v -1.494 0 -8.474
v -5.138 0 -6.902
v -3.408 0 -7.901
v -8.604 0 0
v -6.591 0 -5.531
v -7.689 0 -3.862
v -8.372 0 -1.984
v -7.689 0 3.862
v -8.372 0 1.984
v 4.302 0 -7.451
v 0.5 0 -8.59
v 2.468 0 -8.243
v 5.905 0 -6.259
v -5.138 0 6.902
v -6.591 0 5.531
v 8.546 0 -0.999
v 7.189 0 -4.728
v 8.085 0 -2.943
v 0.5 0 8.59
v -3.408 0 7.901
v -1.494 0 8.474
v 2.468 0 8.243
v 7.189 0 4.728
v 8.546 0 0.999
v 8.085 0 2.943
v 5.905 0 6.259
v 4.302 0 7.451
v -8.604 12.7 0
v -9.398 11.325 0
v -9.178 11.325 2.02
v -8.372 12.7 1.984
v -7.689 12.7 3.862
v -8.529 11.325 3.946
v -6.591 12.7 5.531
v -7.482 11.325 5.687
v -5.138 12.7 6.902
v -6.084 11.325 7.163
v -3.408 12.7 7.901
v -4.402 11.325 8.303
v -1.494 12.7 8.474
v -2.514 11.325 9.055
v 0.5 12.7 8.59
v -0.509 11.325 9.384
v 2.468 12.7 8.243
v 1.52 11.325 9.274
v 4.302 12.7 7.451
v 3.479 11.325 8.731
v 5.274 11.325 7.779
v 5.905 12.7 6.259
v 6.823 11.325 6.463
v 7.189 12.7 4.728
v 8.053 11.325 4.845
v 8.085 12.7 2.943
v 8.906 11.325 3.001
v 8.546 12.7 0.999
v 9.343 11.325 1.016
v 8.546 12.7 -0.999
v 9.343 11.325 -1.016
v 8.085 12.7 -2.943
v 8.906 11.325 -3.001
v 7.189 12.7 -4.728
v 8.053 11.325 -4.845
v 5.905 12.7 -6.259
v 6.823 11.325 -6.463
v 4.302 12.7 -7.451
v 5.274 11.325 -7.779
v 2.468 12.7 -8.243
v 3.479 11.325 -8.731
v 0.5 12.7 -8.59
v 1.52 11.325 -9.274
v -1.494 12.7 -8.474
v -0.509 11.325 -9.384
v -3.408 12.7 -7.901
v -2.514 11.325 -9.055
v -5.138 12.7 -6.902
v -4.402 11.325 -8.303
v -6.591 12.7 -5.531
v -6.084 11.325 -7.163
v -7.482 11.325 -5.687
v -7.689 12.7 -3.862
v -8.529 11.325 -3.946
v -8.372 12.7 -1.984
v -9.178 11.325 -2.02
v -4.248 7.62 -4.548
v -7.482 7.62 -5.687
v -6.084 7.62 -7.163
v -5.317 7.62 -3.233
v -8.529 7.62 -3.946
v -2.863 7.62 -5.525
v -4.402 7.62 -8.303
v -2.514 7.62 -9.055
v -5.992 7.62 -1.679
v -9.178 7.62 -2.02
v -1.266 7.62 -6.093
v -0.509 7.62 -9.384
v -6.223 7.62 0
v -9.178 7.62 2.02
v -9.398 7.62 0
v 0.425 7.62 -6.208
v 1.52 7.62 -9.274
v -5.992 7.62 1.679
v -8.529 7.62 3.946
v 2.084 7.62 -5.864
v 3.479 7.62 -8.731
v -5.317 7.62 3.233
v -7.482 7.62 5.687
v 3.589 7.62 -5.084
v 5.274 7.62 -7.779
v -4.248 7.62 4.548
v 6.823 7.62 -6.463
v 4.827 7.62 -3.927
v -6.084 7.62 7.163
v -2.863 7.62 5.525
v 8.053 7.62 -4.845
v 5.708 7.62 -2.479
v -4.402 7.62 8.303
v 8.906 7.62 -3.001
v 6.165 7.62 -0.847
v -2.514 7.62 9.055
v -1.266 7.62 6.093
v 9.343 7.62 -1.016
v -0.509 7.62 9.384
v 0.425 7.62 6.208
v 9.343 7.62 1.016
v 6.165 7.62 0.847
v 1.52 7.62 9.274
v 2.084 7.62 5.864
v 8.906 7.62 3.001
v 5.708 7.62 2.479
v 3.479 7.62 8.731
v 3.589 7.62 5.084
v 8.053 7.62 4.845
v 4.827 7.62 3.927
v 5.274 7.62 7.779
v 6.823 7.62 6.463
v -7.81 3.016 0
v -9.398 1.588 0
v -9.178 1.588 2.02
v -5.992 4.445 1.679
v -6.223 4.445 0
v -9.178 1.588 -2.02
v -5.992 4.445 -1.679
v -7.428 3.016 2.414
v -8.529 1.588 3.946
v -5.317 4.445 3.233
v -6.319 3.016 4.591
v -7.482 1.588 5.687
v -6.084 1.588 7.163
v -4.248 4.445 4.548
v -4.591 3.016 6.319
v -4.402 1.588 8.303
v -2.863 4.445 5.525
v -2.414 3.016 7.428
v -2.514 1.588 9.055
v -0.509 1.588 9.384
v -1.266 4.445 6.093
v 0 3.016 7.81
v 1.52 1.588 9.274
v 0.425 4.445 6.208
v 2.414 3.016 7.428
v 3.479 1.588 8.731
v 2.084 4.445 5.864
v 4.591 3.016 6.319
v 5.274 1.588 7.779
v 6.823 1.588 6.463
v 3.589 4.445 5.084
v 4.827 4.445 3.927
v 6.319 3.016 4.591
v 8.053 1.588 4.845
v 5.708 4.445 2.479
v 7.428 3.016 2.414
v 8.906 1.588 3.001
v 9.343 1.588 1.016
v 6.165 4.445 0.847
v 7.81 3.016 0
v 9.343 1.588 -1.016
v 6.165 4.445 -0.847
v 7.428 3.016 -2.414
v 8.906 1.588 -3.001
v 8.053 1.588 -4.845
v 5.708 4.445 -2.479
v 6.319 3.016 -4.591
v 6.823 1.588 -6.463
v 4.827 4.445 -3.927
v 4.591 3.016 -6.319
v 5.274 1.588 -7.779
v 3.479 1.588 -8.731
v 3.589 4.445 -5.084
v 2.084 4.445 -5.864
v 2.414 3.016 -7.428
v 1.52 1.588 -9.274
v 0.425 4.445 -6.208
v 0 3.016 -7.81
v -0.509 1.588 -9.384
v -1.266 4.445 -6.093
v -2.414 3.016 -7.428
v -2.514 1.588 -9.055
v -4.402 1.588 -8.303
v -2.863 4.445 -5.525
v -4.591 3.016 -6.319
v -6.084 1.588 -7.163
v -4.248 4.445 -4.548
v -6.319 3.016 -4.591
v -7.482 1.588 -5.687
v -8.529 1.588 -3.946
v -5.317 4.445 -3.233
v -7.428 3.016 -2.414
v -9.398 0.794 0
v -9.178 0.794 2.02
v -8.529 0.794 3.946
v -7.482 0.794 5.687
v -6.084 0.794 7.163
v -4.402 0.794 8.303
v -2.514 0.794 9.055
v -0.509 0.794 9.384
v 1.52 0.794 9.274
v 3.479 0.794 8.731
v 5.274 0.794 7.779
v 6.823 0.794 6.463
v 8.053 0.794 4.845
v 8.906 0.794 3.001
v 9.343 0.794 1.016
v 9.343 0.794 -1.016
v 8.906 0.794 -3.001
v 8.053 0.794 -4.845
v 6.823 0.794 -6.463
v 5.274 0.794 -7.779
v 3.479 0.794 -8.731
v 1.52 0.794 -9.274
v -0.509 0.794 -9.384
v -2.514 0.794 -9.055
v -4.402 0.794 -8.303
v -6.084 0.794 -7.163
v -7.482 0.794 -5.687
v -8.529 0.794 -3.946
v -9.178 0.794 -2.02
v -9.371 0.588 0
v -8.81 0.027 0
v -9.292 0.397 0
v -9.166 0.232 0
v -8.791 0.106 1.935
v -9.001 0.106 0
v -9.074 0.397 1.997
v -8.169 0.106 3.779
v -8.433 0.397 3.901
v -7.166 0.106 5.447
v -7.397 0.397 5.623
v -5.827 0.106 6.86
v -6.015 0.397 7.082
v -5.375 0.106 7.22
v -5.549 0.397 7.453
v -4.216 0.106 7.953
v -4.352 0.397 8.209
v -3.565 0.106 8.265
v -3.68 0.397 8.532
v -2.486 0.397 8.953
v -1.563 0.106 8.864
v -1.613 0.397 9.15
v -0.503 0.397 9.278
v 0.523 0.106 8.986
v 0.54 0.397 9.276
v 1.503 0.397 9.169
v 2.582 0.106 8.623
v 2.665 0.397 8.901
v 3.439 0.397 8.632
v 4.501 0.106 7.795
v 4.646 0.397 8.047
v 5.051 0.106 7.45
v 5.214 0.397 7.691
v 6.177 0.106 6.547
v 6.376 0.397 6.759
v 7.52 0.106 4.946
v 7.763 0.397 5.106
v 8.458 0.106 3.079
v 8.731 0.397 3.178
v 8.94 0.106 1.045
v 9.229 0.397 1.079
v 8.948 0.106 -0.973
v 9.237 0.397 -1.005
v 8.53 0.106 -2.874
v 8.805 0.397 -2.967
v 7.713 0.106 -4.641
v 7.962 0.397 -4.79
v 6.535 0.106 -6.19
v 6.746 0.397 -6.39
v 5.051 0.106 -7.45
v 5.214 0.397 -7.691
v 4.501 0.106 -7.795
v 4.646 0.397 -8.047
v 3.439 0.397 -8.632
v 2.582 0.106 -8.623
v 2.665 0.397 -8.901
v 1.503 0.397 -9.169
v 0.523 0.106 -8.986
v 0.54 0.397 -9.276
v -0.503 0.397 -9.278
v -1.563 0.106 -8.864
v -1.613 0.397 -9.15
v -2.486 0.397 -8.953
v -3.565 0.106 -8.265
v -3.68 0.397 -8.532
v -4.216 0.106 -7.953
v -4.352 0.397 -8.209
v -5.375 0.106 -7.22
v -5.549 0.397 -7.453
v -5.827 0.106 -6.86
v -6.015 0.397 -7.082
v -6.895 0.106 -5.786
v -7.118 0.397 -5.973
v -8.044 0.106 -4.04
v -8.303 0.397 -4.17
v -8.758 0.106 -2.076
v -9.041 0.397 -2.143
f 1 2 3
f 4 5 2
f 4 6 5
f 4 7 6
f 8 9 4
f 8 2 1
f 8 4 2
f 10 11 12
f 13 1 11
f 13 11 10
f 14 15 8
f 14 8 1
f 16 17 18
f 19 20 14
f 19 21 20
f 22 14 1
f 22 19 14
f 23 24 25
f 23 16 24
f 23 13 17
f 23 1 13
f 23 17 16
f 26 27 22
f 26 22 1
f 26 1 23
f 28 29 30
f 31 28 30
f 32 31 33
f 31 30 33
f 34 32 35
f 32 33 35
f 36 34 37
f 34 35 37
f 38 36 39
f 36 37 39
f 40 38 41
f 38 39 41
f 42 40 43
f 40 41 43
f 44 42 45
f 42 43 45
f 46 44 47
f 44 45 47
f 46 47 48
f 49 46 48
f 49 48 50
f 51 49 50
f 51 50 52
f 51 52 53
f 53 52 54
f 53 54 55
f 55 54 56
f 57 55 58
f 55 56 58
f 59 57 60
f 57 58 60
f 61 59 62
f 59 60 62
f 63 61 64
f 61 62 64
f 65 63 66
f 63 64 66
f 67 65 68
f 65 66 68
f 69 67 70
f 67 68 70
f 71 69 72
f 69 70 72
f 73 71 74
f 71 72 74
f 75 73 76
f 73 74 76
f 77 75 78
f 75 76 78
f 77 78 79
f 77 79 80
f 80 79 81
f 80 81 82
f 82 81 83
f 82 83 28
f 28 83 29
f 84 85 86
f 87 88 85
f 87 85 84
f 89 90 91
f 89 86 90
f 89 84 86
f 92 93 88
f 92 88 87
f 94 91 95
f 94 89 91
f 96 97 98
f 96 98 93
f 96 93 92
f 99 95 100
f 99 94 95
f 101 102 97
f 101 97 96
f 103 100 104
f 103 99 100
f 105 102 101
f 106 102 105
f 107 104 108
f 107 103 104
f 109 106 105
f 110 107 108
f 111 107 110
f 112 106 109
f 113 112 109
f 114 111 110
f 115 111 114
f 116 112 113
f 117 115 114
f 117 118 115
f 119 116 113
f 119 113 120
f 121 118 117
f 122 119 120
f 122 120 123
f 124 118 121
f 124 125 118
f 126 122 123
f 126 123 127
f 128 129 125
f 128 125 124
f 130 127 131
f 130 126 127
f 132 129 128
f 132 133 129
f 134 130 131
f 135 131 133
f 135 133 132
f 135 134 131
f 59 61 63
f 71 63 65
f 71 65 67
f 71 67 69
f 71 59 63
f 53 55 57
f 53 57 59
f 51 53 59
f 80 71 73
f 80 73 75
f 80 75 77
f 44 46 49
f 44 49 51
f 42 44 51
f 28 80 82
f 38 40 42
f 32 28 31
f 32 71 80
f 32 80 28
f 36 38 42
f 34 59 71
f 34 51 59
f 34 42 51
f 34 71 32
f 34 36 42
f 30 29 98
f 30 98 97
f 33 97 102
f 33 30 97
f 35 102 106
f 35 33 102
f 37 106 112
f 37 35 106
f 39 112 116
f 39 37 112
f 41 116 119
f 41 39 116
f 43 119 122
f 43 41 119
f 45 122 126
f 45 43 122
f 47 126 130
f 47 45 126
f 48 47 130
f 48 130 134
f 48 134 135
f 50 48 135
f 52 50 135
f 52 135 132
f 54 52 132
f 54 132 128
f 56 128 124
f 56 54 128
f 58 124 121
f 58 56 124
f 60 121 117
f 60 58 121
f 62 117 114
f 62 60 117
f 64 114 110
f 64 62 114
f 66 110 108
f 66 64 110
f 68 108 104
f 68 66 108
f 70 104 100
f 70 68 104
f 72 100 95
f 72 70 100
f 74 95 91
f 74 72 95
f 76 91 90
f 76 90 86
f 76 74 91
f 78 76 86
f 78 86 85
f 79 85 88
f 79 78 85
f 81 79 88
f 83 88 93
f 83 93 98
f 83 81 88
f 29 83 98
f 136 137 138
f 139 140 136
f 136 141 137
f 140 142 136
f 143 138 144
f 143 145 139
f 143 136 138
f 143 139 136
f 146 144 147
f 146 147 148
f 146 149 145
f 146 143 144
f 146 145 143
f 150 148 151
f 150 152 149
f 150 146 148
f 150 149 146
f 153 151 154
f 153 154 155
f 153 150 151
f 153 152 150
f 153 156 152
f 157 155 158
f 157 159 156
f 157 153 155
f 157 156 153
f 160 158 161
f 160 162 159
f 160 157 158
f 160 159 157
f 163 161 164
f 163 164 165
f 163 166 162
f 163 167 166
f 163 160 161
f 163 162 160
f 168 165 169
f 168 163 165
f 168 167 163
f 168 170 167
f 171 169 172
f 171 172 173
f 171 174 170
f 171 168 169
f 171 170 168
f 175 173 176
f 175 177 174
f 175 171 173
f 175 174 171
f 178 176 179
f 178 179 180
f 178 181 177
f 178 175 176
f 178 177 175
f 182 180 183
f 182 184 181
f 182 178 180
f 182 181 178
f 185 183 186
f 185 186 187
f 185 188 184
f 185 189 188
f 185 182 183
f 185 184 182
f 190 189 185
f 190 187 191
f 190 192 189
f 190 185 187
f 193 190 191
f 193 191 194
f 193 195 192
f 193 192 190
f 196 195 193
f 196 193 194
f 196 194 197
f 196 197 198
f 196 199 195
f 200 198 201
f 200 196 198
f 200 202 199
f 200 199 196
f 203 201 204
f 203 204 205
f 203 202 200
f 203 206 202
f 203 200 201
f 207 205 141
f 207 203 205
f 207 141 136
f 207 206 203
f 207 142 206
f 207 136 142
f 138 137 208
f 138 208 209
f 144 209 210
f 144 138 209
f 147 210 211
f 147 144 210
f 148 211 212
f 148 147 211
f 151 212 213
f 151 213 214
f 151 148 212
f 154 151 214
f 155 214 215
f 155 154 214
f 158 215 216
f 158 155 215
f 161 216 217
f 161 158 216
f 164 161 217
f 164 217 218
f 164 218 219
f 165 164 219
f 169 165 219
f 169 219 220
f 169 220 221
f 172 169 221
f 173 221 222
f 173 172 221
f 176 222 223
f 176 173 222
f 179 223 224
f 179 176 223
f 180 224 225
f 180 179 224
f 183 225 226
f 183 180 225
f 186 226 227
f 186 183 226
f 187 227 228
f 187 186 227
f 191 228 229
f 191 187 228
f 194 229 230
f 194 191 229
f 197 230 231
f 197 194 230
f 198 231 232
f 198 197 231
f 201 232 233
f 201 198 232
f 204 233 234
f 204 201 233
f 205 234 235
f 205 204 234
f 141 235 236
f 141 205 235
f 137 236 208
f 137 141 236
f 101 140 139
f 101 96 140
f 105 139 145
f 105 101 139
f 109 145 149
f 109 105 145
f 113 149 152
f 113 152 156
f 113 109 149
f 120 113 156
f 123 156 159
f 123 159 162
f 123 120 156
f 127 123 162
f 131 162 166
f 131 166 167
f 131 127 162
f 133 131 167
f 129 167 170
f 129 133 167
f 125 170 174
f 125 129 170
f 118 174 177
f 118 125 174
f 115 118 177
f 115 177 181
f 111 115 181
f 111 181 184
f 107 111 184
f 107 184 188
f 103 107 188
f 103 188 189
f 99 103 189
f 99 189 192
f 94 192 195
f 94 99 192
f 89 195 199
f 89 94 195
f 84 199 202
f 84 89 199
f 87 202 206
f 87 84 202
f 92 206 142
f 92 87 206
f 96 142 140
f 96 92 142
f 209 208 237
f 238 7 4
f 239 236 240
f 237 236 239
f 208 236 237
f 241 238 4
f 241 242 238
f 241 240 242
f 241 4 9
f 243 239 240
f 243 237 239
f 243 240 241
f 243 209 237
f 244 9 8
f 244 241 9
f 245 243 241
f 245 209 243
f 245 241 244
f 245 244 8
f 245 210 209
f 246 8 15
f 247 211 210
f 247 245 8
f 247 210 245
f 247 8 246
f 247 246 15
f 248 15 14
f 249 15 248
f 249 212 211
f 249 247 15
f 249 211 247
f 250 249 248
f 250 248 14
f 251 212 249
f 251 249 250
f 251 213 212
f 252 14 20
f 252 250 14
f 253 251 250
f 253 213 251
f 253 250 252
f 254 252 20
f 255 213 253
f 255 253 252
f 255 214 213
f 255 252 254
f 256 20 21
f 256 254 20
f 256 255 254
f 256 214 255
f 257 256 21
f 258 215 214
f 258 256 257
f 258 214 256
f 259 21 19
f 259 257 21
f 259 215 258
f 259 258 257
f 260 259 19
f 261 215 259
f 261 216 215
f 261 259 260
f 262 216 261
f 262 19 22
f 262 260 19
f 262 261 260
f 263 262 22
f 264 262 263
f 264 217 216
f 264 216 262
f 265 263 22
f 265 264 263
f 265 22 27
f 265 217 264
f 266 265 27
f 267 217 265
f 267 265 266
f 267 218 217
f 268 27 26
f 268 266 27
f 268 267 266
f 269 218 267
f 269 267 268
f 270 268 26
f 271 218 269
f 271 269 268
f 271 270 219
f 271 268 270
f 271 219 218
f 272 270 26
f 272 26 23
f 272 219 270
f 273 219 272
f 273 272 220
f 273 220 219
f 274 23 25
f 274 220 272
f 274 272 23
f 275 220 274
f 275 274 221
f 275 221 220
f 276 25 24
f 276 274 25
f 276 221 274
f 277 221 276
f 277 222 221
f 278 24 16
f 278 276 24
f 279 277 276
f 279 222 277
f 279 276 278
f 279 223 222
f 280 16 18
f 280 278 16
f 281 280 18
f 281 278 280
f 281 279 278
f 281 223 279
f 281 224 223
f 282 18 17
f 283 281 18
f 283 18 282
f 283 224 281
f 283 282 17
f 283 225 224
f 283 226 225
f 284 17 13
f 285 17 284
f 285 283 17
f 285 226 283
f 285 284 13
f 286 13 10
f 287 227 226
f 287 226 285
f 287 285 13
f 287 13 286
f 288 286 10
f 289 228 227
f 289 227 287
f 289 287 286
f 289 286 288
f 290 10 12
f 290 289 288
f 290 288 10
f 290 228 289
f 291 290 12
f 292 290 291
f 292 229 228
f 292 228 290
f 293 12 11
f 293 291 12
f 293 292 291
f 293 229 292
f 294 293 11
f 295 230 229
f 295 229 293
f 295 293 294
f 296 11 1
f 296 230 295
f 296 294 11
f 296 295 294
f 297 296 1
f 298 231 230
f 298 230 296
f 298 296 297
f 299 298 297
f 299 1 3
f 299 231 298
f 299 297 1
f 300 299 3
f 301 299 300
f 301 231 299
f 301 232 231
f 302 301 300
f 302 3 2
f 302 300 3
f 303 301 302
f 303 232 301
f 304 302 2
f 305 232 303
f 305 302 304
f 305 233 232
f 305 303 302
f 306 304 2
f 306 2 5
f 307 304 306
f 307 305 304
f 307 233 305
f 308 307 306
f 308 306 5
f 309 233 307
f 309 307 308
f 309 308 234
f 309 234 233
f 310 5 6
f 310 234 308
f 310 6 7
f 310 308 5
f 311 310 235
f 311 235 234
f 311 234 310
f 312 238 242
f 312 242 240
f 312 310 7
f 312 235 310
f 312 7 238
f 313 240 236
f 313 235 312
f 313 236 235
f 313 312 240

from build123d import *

# Parameters (mm, degrees)
FILLET1_R      = 0.79375
CHAMFER1_SIZE  = 0.79375
CHAMFER1_SIZE2 = 1.374815329


with BuildPart() as part:
    # Sketch1 → Revolve1 (revolve)
    with BuildSketch(Plane.XY):
        Polygon((0, 0), (-9.398, 0), (-9.398, 1.5875), (-6.223, 4.445), (-6.223, 7.62), (-9.398, 7.62), (-9.398, 12.7), (0, 12.7), align=None)
    revolve(axis=Axis((0, 0, 0), (0, 1, 0)))

    # Fillet1
    fillet1_edges = [part.edges().sort_by_distance(p)[0] for p in [
        (9.398, 0, 0),
    ]]
    fillet(fillet1_edges, radius=FILLET1_R)

    # Chamfer1
    chamfer1_edges = [part.edges().sort_by_distance(p)[0] for p in [
        (9.398, 12.7, 0),
    ]]
    chamfer1_side = [part.faces().sort_by_distance(p)[0] for p in [
        (0, 12.7, 0),
    ]]
    chamfer(chamfer1_edges, length=CHAMFER1_SIZE, length2=CHAMFER1_SIZE2, reference=chamfer1_side[0])


solid = part.part
